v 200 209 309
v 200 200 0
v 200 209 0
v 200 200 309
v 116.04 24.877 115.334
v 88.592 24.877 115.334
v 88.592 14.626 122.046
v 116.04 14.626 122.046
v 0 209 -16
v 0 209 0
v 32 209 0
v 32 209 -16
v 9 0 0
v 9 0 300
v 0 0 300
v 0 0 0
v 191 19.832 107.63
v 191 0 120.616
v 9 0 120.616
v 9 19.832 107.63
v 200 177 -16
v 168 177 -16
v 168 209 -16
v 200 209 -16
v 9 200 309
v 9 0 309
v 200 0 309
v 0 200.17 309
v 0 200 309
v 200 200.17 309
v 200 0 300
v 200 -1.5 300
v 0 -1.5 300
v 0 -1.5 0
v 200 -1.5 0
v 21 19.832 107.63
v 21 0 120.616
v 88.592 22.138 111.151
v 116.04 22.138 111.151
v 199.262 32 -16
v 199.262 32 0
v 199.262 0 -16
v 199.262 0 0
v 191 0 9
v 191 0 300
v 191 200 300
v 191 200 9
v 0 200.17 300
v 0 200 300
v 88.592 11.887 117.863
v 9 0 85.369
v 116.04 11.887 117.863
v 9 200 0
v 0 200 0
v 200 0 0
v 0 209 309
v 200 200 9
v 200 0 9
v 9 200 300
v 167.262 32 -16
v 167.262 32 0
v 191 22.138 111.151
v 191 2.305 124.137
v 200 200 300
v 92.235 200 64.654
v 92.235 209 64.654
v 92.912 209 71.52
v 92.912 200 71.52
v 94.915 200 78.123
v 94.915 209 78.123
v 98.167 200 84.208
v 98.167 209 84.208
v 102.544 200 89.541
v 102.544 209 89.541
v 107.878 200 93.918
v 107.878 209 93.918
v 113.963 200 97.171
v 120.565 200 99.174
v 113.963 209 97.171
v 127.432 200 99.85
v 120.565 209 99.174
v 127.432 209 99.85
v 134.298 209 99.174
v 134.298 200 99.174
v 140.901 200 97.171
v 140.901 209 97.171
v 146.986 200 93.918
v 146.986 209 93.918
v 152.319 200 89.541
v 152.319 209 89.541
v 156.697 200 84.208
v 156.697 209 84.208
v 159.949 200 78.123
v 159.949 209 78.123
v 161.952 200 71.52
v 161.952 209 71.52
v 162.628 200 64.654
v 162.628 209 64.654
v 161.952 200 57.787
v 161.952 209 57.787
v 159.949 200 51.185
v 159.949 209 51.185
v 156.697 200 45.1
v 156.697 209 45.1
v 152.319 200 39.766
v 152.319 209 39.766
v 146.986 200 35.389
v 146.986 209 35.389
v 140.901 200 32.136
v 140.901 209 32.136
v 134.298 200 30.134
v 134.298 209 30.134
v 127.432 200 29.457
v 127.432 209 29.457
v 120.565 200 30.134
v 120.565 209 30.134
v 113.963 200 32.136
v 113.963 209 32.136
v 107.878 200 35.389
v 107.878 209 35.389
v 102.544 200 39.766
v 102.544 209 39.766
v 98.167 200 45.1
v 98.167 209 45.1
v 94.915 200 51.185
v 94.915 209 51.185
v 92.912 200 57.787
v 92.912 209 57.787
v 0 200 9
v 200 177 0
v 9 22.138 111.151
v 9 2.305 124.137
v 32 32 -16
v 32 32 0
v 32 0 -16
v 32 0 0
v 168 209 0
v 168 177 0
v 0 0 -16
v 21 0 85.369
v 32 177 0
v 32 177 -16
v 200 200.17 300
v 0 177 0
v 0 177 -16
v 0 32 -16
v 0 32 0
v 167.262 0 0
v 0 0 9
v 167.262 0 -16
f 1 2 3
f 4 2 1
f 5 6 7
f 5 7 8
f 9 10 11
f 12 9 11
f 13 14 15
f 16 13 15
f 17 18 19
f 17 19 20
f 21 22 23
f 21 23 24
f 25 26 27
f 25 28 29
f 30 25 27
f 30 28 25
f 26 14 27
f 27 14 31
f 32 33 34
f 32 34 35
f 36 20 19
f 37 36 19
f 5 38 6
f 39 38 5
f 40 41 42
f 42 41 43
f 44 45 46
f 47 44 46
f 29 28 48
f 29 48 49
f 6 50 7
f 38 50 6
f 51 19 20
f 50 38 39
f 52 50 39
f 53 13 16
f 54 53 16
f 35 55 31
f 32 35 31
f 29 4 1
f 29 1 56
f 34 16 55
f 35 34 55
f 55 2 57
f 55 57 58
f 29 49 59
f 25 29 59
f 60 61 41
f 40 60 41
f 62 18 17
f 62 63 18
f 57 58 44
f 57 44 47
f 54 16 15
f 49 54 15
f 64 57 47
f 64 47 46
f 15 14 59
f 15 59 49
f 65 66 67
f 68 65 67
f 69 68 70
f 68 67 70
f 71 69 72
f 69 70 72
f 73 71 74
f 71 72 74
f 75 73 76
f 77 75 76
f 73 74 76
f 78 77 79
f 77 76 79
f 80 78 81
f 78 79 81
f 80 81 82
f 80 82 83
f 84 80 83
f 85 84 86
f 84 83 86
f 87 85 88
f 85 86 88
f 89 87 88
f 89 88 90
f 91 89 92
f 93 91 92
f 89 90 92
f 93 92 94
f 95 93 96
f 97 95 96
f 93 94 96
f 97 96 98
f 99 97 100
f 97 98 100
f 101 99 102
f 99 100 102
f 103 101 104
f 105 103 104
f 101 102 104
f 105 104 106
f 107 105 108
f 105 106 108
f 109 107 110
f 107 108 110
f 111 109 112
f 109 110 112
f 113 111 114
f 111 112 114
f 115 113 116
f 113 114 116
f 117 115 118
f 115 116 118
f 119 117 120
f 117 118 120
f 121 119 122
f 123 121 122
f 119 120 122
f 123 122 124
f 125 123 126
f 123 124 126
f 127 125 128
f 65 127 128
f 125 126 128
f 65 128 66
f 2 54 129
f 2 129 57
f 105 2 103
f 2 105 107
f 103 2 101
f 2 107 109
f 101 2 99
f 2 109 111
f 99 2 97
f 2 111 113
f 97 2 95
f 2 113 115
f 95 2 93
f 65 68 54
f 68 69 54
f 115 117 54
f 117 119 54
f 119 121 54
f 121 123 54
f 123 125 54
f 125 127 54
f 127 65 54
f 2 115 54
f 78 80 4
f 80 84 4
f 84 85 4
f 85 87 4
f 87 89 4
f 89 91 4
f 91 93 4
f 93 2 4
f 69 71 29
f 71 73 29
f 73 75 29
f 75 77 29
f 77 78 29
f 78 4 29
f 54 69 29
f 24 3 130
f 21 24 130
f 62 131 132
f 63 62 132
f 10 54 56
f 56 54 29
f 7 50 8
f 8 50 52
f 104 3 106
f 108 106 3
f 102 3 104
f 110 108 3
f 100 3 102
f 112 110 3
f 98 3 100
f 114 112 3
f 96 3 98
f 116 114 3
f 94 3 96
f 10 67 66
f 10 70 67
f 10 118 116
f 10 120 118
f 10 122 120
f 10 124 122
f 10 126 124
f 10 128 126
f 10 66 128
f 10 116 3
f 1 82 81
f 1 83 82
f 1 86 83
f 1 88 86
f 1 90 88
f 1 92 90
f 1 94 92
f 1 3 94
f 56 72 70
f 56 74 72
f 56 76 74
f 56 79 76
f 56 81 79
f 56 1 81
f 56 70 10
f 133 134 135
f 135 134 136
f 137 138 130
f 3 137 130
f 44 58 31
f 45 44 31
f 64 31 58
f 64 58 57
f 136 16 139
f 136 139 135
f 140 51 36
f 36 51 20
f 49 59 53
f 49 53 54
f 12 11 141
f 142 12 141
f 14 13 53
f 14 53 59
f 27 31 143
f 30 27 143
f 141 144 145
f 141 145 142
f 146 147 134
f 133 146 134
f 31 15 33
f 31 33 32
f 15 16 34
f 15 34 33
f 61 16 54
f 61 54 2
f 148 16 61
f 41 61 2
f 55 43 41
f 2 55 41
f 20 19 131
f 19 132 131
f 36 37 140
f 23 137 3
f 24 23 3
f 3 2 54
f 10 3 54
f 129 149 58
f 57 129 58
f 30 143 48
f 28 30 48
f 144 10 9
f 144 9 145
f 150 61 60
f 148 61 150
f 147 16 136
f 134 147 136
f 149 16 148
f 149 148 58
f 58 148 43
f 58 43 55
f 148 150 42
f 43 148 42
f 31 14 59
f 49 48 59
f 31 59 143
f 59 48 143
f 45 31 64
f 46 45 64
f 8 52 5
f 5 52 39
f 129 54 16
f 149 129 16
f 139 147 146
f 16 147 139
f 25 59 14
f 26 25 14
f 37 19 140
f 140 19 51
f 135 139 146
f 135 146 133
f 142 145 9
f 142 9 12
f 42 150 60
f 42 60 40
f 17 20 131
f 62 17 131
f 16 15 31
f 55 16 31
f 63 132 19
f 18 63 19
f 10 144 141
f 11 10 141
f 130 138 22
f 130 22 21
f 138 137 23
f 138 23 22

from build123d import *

# Parameters (mm, degrees)
F0_W      = 200
F0_H      = 300
F1_DEPTH  = 1.5
F2_W      = 9
F2_H      = 300
F3_DEPTH  = 200
F5_DEPTH  = 12
F7_DEPTH  = 182
F8_W      = 27.4480059743
F8_H      = 12.2530327478
F9_DEPTH  = 5
F10_W     = 200
F10_H     = 200
F11_DEPTH = 9
F12_W     = 200
F12_H     = 291
F13_DEPTH = 9
F15_DEPTH = 9
F16_W     = 200
F16_H     = 309
F17_DEPTH = 9
F18_W     = 32
F18_H     = 32
F19_DEPTH = 16
F20_W     = 32
F20_H     = 32
F21_DEPTH = 16
F22_W     = 32
F22_H     = 32
F23_DEPTH = 16
F24_W     = 32
F24_H     = 32
F25_DEPTH = 16
F26_R     = 35.1963697209
F27_DEPTH = 9


with BuildPart() as f1:
    # F0 (on Front) → F1 (new body)
    with BuildSketch(Plane.XZ):
        with Locations((100, 150)):
            Rectangle(F0_W, F0_H)
    extrude(amount=F1_DEPTH)


with BuildPart() as f3:
    # F2 (on face) → F3 (new body)
    with BuildSketch(Plane(origin=(0, 0, 0), x_dir=(-1, 0, 0), z_dir=(0, 1, 0))):
        with Locations((-4.5, 150)):
            Rectangle(F2_W, F2_H)
    extrude(amount=F3_DEPTH)


with BuildPart() as f5:
    # F4 (on face) → F5 (new body)
    with BuildSketch(Plane.YZ.offset(9)):
        Polygon((19.8321547359, 107.6303049922), (0, 120.6161677837), (0, 85.3688195348), align=None)
    extrude(amount=F5_DEPTH)


with BuildPart() as f7:
    # F6 (on face) → F7 (new body)
    with BuildSketch(Plane.YZ.offset(9)):
        Polygon((0, 120.6161677837), (19.8321547359, 107.6303049922), (22.1375450676, 111.151122863), (2.3053903316, 124.1369856545), align=None)
    extrude(amount=F7_DEPTH)


with BuildPart() as f9:
    # F8 (on face) → F9 (new body)
    with BuildSketch(Plane(origin=(0, 57.5832075724, 87.9417179358), x_dir=(1, 0, 0), z_dir=(0, 0.5478013947, 0.8366084102))):
        with Locations((102.3163087666, -48.4948001187)):
            Rectangle(F8_W, F8_H)
    extrude(amount=F9_DEPTH)


with BuildPart() as f11:
    # F10 (on face) → F11 (new body)
    with BuildSketch(Plane(origin=(0, 0, 0), x_dir=(1, 0, 0), z_dir=(0, 0, -1))):
        with Locations((100, -100)):
            Rectangle(F10_W, F10_H)
    extrude(amount=-F11_DEPTH)

    # F20 (on face) → F21 (join)
    with BuildSketch(Plane(origin=(0, 0, 0), x_dir=(1, 0, 0), z_dir=(0, 0, -1))):
        with Locations((183.2620132922, -16)):
            Rectangle(F20_W, F20_H)
    extrude(amount=F21_DEPTH)


with BuildPart() as f13:
    # F12 (on face) → F13 (new body)
    with BuildSketch(Plane.YZ.offset(200)):
        with Locations((100, 154.5)):
            Rectangle(F12_W, F12_H)
    extrude(amount=-F13_DEPTH)


with BuildPart() as f15:
    # F14 (on face) → F15 (new body)
    with BuildSketch(Plane.XY.offset(300)):
        Polygon((9, 200), (9, 0), (200, 0), (200, 200.1701496304), (0, 200.1701496304), (0, 200), align=None)
    extrude(amount=F15_DEPTH)


with BuildPart() as f17:
    # F16 (on face) → F17 (new body)
    with BuildSketch(Plane(origin=(0, 200, 0), x_dir=(-1, 0, 0), z_dir=(0, 1, 0))):
        with Locations((-100, 154.5)):
            Rectangle(F16_W, F16_H)
    extrude(amount=F17_DEPTH)

    # F26 (on face) → F27 (cut)
    with BuildSketch(Plane(origin=(0, 209, 0), x_dir=(-1, 0, 0), z_dir=(0, 1, 0))):
        with Locations((-127.4318397045, 64.6535977721)):
            Circle(F26_R)
    extrude(amount=-F27_DEPTH, mode=Mode.SUBTRACT)


with BuildPart() as f19:
    # F18 (on face) → F19 (new body)
    with BuildSketch(Plane(origin=(0, 0, 0), x_dir=(1, 0, 0), z_dir=(0, 0, -1))):
        with Locations((16, -16)):
            Rectangle(F18_W, F18_H)
    extrude(amount=F19_DEPTH)


with BuildPart() as f23:
    # F22 (on face) → F23 (new body)
    with BuildSketch(Plane(origin=(0, 0, 0), x_dir=(1, 0, 0), z_dir=(0, 0, -1))):
        with Locations((16, -193)):
            Rectangle(F22_W, F22_H)
    extrude(amount=F23_DEPTH)


with BuildPart() as f25:
    # F24 (on face) → F25 (new body)
    with BuildSketch(Plane(origin=(0, 0, 0), x_dir=(1, 0, 0), z_dir=(0, 0, -1))):
        with Locations((184, -193)):
            Rectangle(F24_W, F24_H)
    extrude(amount=F25_DEPTH)


solid = Compound([f1.part, f3.part, f5.part, f7.part, f9.part, f11.part, f13.part, f15.part, f17.part, f19.part, f23.part, f25.part])
